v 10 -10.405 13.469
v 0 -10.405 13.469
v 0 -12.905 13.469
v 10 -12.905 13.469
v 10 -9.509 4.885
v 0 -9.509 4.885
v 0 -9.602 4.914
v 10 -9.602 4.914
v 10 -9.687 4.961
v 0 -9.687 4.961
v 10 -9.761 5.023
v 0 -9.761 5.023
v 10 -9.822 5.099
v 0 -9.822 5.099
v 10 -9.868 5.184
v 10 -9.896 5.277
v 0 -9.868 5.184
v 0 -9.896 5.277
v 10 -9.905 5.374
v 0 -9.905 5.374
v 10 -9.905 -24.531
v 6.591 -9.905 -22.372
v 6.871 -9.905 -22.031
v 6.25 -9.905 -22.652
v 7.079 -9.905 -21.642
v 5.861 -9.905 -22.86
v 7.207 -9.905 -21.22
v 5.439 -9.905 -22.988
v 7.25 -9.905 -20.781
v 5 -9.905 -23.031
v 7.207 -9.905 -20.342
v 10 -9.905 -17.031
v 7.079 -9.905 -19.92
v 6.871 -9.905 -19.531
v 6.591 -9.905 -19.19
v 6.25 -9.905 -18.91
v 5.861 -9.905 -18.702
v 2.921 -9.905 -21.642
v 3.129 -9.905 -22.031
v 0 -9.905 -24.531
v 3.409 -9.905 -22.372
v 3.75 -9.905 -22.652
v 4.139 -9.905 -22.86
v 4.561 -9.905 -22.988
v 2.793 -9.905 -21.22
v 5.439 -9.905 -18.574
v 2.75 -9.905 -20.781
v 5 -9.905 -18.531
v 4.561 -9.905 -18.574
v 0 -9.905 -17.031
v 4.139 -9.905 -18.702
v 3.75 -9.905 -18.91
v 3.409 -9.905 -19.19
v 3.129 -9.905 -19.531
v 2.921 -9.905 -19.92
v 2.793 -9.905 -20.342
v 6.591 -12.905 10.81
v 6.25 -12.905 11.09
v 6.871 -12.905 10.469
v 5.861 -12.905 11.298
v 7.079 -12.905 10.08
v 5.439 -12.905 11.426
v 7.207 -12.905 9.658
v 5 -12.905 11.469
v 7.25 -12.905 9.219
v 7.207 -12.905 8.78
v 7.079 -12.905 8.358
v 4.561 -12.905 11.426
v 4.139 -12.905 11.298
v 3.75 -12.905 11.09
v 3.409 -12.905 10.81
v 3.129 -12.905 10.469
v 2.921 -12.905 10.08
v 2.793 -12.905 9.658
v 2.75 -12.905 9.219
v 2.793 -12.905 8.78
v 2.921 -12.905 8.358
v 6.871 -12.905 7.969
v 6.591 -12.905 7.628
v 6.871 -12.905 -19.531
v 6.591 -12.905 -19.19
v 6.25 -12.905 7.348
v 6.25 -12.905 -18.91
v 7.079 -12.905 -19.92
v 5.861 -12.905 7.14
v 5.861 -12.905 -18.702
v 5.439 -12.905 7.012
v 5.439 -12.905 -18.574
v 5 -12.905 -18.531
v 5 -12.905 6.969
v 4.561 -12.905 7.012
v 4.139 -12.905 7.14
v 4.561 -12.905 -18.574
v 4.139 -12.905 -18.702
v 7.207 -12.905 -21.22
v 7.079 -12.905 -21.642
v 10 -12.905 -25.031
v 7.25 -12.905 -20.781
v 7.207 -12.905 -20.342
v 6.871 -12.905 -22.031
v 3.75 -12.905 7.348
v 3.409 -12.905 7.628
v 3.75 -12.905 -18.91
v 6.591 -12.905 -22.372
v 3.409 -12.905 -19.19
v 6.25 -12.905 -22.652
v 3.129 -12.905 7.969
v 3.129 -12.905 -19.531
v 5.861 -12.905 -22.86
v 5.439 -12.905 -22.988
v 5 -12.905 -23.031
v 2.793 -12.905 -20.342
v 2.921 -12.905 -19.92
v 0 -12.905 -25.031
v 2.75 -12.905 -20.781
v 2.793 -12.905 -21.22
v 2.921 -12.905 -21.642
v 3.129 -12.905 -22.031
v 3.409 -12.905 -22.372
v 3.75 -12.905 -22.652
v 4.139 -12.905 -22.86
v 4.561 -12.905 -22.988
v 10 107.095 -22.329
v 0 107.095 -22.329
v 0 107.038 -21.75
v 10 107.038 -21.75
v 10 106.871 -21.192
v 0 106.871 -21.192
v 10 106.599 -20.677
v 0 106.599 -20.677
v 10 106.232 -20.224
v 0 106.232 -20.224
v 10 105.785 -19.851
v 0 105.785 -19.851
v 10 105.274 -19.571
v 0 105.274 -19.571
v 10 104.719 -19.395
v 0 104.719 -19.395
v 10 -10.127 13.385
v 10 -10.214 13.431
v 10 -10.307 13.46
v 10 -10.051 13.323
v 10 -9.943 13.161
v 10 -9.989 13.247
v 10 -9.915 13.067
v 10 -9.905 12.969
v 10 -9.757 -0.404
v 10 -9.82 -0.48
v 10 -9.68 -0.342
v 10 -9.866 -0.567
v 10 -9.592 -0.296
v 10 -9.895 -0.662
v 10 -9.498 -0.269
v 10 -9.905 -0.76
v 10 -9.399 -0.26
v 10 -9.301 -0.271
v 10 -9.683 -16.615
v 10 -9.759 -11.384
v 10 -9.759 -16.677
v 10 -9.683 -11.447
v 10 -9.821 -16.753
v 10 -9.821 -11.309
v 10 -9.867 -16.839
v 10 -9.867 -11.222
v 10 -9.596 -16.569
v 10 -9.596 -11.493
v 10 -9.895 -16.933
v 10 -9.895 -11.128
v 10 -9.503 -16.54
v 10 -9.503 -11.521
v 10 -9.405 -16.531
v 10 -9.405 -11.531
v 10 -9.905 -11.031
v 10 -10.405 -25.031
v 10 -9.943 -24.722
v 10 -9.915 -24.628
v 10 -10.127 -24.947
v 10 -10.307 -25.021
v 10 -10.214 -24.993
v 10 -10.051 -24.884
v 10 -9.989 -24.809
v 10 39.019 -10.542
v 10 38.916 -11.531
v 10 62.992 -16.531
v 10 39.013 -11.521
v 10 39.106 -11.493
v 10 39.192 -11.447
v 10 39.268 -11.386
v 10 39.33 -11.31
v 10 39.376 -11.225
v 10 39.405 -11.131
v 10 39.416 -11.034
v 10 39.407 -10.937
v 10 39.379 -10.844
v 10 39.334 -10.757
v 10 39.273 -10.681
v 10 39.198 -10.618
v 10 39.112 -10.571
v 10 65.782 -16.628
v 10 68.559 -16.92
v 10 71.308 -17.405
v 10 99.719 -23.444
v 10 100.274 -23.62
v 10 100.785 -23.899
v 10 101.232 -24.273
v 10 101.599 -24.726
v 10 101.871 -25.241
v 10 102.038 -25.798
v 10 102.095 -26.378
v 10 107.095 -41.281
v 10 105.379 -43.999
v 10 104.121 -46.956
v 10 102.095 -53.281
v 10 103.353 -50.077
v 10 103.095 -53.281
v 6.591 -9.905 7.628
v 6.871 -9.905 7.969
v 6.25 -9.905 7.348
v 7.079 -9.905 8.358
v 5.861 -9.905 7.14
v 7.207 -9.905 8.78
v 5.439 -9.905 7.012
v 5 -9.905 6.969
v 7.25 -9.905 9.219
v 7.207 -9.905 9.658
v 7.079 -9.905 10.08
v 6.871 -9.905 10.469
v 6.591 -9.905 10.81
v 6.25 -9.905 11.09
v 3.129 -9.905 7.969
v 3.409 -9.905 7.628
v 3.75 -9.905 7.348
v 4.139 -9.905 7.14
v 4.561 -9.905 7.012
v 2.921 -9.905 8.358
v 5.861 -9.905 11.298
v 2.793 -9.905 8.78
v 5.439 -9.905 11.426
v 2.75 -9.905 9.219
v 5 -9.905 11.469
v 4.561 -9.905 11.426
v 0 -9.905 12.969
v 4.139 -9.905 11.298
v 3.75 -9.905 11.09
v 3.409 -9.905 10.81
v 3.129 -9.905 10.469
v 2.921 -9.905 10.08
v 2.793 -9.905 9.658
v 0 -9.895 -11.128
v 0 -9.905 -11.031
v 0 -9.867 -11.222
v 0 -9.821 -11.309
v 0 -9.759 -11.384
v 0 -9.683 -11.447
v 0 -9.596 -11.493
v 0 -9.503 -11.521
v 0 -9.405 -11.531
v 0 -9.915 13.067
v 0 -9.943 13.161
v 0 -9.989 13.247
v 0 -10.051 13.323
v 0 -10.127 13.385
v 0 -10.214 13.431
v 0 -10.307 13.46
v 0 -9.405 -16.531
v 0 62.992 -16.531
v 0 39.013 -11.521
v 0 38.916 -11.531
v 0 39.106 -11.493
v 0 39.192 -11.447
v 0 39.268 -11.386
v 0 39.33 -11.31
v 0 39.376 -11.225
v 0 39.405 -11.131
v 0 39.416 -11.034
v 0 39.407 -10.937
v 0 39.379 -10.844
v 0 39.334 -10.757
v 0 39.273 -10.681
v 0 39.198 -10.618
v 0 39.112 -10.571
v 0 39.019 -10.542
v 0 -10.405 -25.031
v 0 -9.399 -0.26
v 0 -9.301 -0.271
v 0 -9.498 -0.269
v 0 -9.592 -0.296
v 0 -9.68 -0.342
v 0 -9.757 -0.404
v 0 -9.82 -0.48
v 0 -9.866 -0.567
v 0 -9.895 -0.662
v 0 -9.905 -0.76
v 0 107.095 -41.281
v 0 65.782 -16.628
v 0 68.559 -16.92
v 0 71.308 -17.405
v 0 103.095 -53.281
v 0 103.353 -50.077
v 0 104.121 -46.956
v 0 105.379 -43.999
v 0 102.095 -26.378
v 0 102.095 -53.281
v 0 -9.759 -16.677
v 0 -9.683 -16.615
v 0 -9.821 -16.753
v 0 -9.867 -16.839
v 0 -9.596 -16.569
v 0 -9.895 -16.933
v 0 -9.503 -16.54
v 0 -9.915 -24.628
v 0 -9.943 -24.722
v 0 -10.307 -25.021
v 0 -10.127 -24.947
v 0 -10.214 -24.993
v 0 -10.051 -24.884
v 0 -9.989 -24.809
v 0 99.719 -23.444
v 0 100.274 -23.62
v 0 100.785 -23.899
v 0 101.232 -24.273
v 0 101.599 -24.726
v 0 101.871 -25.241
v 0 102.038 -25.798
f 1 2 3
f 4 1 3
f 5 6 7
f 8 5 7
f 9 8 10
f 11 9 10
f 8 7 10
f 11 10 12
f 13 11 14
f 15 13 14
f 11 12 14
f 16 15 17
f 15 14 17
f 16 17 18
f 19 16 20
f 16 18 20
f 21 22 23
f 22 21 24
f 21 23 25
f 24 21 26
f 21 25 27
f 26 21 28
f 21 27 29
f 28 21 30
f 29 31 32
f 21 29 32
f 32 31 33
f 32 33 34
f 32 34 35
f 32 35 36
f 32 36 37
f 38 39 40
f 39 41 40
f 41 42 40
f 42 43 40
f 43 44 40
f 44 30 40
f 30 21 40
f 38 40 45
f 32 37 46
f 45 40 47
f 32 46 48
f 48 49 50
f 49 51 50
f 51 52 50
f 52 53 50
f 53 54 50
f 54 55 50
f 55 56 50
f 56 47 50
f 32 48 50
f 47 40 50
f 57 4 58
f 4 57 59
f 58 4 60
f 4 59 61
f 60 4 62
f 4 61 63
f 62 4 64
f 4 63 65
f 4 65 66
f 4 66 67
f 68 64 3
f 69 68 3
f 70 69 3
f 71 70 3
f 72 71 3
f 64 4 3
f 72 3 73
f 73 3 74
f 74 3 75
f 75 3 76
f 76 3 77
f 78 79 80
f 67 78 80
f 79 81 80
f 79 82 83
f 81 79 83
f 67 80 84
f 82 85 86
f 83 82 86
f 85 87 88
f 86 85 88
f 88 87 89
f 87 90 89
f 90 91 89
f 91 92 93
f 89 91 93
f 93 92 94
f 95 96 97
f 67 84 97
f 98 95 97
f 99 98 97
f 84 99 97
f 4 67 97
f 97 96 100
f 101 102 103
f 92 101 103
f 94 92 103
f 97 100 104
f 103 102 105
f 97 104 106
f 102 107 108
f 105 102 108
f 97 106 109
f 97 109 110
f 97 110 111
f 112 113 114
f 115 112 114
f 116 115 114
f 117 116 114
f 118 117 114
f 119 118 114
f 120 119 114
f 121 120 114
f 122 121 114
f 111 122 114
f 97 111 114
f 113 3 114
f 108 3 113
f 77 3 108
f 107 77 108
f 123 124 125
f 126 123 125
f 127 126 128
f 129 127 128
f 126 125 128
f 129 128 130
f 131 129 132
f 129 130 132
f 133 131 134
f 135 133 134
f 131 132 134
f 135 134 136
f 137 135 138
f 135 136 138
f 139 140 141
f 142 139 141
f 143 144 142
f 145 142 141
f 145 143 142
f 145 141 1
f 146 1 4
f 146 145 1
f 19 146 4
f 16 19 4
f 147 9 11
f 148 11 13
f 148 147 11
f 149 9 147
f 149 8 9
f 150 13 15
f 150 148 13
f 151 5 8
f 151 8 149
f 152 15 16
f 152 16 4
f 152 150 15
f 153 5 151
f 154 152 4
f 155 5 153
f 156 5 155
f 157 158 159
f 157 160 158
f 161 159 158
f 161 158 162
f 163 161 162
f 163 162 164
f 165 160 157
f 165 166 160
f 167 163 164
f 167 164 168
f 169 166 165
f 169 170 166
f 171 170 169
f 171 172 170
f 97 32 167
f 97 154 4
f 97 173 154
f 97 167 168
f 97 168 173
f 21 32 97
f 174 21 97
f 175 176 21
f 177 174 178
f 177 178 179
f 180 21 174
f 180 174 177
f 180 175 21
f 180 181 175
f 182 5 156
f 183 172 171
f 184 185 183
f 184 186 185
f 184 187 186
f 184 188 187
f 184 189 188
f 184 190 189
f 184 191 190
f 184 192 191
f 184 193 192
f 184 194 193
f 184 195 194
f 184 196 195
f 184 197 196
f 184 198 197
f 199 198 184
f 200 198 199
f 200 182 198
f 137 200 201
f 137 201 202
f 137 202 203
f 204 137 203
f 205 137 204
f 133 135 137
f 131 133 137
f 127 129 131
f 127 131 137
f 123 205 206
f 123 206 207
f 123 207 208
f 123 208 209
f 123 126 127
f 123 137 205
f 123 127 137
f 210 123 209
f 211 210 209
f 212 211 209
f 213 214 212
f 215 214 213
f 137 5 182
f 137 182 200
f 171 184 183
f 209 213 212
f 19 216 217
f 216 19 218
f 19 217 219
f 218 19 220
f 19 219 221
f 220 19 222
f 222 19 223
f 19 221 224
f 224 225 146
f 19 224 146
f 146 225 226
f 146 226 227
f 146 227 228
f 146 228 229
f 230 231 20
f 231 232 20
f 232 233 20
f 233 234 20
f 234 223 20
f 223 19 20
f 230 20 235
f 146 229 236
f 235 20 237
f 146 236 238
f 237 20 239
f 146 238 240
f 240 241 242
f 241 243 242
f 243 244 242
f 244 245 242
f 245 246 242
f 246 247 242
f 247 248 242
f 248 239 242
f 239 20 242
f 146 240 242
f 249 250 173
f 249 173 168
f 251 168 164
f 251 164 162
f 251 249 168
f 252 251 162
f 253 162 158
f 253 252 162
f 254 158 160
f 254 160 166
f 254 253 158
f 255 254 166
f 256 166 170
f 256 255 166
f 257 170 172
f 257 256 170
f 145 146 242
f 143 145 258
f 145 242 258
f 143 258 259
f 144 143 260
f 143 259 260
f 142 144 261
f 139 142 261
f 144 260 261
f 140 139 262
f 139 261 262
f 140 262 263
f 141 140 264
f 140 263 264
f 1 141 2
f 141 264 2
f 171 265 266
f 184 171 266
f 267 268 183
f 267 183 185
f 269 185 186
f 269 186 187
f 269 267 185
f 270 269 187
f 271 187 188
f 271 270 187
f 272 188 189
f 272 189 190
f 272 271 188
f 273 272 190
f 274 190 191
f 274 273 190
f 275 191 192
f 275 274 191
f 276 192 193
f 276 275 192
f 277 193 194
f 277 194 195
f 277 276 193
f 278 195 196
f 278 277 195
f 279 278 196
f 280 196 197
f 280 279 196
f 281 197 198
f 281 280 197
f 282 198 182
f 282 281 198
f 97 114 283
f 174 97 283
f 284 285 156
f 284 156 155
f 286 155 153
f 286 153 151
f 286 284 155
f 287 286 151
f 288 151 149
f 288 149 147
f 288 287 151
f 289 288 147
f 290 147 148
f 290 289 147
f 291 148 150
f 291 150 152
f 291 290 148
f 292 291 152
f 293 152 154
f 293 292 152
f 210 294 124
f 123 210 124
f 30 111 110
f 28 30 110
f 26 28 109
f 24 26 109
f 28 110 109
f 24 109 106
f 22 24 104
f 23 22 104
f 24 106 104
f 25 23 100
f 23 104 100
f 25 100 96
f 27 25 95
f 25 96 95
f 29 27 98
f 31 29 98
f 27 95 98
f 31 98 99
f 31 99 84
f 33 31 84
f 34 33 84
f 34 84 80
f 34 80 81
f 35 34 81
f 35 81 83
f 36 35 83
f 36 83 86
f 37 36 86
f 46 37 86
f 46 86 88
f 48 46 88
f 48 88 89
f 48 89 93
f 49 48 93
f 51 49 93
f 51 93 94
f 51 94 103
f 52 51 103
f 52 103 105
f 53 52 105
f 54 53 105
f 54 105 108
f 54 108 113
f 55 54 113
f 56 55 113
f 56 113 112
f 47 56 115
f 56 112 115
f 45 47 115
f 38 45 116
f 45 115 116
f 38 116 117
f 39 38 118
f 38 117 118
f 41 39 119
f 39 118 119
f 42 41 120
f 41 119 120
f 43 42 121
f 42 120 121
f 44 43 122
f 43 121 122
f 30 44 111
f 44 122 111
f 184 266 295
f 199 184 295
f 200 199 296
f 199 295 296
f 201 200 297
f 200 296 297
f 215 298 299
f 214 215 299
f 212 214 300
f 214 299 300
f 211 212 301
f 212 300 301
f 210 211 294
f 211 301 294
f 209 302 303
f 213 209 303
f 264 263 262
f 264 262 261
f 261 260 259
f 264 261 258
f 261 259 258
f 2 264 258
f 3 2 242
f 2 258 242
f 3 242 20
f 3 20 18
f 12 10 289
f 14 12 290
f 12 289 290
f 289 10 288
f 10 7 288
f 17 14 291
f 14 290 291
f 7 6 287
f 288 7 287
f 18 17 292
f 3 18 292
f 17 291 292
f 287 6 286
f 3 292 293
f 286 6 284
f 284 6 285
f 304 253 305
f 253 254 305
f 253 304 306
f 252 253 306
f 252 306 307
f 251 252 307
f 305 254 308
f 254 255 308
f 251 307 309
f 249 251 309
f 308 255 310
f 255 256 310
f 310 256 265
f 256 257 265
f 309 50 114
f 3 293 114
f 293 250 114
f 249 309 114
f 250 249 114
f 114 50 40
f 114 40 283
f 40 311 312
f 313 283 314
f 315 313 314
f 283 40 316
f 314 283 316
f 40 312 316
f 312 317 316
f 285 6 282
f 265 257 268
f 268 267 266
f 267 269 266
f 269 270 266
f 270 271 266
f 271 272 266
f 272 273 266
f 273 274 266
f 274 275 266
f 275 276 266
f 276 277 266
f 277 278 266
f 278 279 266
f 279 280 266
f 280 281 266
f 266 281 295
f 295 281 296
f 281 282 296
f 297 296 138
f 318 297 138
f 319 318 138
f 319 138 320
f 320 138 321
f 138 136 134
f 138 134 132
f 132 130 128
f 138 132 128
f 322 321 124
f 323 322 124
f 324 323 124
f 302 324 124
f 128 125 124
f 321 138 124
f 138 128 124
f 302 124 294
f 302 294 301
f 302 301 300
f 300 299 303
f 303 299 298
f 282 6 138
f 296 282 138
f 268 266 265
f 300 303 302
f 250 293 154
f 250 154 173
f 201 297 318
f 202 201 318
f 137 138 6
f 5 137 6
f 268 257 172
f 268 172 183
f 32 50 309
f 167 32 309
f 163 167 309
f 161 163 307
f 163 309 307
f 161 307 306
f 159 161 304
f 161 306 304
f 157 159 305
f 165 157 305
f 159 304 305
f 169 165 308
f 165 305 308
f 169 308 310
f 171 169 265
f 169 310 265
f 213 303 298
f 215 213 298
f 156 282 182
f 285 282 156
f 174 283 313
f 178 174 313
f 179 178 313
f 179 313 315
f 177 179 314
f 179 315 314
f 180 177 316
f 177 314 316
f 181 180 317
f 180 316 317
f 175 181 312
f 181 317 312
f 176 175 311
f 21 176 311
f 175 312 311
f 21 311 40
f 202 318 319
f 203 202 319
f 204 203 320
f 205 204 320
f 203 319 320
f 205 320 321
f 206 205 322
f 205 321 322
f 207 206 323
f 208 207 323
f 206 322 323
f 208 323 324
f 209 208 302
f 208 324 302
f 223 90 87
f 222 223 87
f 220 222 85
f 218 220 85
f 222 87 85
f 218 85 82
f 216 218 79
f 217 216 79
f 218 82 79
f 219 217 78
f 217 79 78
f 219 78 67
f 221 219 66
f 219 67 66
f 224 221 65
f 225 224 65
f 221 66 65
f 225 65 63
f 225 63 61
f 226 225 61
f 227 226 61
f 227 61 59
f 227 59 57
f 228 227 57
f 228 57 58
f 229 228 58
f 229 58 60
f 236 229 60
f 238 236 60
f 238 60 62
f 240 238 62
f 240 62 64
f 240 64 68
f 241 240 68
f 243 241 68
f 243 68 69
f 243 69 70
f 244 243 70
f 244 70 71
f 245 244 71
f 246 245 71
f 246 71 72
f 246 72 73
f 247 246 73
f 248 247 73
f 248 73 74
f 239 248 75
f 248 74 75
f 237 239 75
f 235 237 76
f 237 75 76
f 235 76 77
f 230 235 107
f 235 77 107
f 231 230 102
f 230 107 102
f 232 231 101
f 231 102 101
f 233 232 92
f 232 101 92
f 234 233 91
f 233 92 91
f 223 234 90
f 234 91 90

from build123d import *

# Parameters (mm, degrees)
BOSS_EXTRUDE1_DEPTH = 10
SKETCH1_5_OUTSIDE_W = 96.286
SKETCH1_5_OUTSIDE_H = 149.536
CUT_EXTRUDE2_DEPTH  = 10
SKETCH5_R           = 2.25
CUT_EXTRUDE3_DEPTH  = 10


with BuildPart() as part:
    # Sketch1 → Boss-Extrude1 (new body)
    with BuildSketch(Plane(origin=(0, 0, 0), x_dir=(0, 0, -1), z_dir=(1, 0, 0))):
        with BuildLine():
            Line((19.39483456, 104.718712665), (-4.885010669, -9.508978253))
            ThreePointArc((-4.885010669, -9.508978253), (-5.059424274, -9.793595388), (-5.374084469, -9.905022408))
            Line((-5.374084469, -9.905022408), (-12.969192453, -9.905022408))
            ThreePointArc((-12.969192453, -9.905022408), (-13.322745843, -10.051469017), (-13.469192453, -10.405022408))
            Line((-13.469192453, -10.405022408), (-13.469192453, -12.905022408))
            Line((-13.469192453, -12.905022408), (25.030807547, -12.905022408))
            Line((25.030807547, -12.905022408), (25.030807547, -10.405022408))
            ThreePointArc((25.030807547, -10.405022408), (24.884360938, -10.051469017), (24.530807547, -9.905022408))
            Line((24.530807547, -9.905022408), (17.030807547, -9.905022408))
            ThreePointArc((17.030807547, -9.905022408), (16.677254157, -9.758575798), (16.530807547, -9.405022408))
            Line((16.530807547, -9.405022408), (16.530807547, 62.991683812))
            ThreePointArc((16.530807547, 62.991683812), (16.749931733, 67.172822342), (17.404903518, 71.308151444))
            Line((17.404903518, 71.308151444), (23.443754726, 99.718712665))
            ThreePointArc((23.443754726, 99.718712665), (24.490236355, 101.426415477), (26.378197528, 102.094977592))
            Line((26.378197528, 102.094977592), (53.280807547, 102.094977592))
            Line((53.280807547, 102.094977592), (53.280807547, 103.094977592))
            ThreePointArc((53.280807547, 103.094977592), (46.956252227, 104.121311631), (41.280807547, 107.094977592))
            Line((41.280807547, 107.094977592), (22.329277362, 107.094977592))
            ThreePointArc((22.329277362, 107.094977592), (20.441316189, 106.426415477), (19.39483456, 104.718712665))
        make_face()
    extrude(amount=BOSS_EXTRUDE1_DEPTH)

    # Sketch1<5> outside → Cut-Extrude2 (cut)
    # profile 1 of 2: a face of its own
    with BuildSketch(Plane(origin=(0, 0, 0), x_dir=(0, 0, -1), z_dir=(1, 0, 0))):
        with Locations((19.906, 47.095)):
            Rectangle(SKETCH1_5_OUTSIDE_W, SKETCH1_5_OUTSIDE_H)
        with BuildLine():
            Line((19.39483456, 104.718712665), (-4.885010669, -9.508978253))
            ThreePointArc((-4.885010669, -9.508978253), (-5.059424274, -9.793595388), (-5.374084469, -9.905022408))
            Line((-5.374084469, -9.905022408), (-12.969192453, -9.905022408))
            ThreePointArc((-12.969192453, -9.905022408), (-13.322745843, -10.051469017), (-13.469192453, -10.405022408))
            Line((-13.469192453, -10.405022408), (-13.469192453, -12.905022408))
            Line((-13.469192453, -12.905022408), (25.030807547, -12.905022408))
            Line((25.030807547, -12.905022408), (25.030807547, -10.405022408))
            ThreePointArc((25.030807547, -10.405022408), (24.884360938, -10.051469017), (24.530807547, -9.905022408))
            Line((24.530807547, -9.905022408), (17.030807547, -9.905022408))
            ThreePointArc((17.030807547, -9.905022408), (16.677254157, -9.758575798), (16.530807547, -9.405022408))
            Line((16.530807547, -9.405022408), (16.530807547, 62.991683812))
            ThreePointArc((16.530807547, 62.991683812), (16.749931733, 67.172822342), (17.404903518, 71.308151444))
            Line((17.404903518, 71.308151444), (23.443754726, 99.718712665))
            ThreePointArc((23.443754726, 99.718712665), (24.490236355, 101.426415477), (26.378197528, 102.094977592))
            Line((26.378197528, 102.094977592), (53.280807547, 102.094977592))
            Line((53.280807547, 102.094977592), (53.280807547, 103.094977592))
            ThreePointArc((53.280807547, 103.094977592), (46.956252227, 104.121311631), (41.280807547, 107.094977592))
            Line((41.280807547, 107.094977592), (22.329277362, 107.094977592))
            ThreePointArc((22.329277362, 107.094977592), (20.441316189, 106.426415477), (19.39483456, 104.718712665))
        make_face(mode=Mode.SUBTRACT)
    # profile 2 of 2: a face of its own
    with BuildSketch(Plane(origin=(0, 0, 0), x_dir=(0, 0, -1), z_dir=(1, 0, 0))):
        with BuildLine():
            Line((0.7599591, -9.905022408), (11.030807547, -9.905022408))
            ThreePointArc((11.030807547, -9.905022408), (11.384360938, -9.758575798), (11.530807547, -9.405022408))
            Line((11.530807547, -9.405022408), (11.530807547, 38.915520448))
            ThreePointArc((11.530807547, 38.915520448), (11.083071779, 39.412781396), (10.541733747, 39.019476293))
            Line((10.541733747, 39.019476293), (0.2708853, -9.301066562))
            ThreePointArc((0.2708853, -9.301066562), (0.371386119, -9.719682603), (0.7599591, -9.905022408))
        make_face()
    extrude(amount=CUT_EXTRUDE2_DEPTH, mode=Mode.SUBTRACT)

    # Sketch5 → Cut-Extrude3 (cut)
    with BuildSketch(Plane.XZ.offset(12.905022408)):
        with Locations((5, 9.219192453)):
            Circle(SKETCH5_R)
        with Locations((5, -20.780807547)):
            Circle(SKETCH5_R)
    extrude(amount=-CUT_EXTRUDE3_DEPTH, mode=Mode.SUBTRACT)


solid = part.part
